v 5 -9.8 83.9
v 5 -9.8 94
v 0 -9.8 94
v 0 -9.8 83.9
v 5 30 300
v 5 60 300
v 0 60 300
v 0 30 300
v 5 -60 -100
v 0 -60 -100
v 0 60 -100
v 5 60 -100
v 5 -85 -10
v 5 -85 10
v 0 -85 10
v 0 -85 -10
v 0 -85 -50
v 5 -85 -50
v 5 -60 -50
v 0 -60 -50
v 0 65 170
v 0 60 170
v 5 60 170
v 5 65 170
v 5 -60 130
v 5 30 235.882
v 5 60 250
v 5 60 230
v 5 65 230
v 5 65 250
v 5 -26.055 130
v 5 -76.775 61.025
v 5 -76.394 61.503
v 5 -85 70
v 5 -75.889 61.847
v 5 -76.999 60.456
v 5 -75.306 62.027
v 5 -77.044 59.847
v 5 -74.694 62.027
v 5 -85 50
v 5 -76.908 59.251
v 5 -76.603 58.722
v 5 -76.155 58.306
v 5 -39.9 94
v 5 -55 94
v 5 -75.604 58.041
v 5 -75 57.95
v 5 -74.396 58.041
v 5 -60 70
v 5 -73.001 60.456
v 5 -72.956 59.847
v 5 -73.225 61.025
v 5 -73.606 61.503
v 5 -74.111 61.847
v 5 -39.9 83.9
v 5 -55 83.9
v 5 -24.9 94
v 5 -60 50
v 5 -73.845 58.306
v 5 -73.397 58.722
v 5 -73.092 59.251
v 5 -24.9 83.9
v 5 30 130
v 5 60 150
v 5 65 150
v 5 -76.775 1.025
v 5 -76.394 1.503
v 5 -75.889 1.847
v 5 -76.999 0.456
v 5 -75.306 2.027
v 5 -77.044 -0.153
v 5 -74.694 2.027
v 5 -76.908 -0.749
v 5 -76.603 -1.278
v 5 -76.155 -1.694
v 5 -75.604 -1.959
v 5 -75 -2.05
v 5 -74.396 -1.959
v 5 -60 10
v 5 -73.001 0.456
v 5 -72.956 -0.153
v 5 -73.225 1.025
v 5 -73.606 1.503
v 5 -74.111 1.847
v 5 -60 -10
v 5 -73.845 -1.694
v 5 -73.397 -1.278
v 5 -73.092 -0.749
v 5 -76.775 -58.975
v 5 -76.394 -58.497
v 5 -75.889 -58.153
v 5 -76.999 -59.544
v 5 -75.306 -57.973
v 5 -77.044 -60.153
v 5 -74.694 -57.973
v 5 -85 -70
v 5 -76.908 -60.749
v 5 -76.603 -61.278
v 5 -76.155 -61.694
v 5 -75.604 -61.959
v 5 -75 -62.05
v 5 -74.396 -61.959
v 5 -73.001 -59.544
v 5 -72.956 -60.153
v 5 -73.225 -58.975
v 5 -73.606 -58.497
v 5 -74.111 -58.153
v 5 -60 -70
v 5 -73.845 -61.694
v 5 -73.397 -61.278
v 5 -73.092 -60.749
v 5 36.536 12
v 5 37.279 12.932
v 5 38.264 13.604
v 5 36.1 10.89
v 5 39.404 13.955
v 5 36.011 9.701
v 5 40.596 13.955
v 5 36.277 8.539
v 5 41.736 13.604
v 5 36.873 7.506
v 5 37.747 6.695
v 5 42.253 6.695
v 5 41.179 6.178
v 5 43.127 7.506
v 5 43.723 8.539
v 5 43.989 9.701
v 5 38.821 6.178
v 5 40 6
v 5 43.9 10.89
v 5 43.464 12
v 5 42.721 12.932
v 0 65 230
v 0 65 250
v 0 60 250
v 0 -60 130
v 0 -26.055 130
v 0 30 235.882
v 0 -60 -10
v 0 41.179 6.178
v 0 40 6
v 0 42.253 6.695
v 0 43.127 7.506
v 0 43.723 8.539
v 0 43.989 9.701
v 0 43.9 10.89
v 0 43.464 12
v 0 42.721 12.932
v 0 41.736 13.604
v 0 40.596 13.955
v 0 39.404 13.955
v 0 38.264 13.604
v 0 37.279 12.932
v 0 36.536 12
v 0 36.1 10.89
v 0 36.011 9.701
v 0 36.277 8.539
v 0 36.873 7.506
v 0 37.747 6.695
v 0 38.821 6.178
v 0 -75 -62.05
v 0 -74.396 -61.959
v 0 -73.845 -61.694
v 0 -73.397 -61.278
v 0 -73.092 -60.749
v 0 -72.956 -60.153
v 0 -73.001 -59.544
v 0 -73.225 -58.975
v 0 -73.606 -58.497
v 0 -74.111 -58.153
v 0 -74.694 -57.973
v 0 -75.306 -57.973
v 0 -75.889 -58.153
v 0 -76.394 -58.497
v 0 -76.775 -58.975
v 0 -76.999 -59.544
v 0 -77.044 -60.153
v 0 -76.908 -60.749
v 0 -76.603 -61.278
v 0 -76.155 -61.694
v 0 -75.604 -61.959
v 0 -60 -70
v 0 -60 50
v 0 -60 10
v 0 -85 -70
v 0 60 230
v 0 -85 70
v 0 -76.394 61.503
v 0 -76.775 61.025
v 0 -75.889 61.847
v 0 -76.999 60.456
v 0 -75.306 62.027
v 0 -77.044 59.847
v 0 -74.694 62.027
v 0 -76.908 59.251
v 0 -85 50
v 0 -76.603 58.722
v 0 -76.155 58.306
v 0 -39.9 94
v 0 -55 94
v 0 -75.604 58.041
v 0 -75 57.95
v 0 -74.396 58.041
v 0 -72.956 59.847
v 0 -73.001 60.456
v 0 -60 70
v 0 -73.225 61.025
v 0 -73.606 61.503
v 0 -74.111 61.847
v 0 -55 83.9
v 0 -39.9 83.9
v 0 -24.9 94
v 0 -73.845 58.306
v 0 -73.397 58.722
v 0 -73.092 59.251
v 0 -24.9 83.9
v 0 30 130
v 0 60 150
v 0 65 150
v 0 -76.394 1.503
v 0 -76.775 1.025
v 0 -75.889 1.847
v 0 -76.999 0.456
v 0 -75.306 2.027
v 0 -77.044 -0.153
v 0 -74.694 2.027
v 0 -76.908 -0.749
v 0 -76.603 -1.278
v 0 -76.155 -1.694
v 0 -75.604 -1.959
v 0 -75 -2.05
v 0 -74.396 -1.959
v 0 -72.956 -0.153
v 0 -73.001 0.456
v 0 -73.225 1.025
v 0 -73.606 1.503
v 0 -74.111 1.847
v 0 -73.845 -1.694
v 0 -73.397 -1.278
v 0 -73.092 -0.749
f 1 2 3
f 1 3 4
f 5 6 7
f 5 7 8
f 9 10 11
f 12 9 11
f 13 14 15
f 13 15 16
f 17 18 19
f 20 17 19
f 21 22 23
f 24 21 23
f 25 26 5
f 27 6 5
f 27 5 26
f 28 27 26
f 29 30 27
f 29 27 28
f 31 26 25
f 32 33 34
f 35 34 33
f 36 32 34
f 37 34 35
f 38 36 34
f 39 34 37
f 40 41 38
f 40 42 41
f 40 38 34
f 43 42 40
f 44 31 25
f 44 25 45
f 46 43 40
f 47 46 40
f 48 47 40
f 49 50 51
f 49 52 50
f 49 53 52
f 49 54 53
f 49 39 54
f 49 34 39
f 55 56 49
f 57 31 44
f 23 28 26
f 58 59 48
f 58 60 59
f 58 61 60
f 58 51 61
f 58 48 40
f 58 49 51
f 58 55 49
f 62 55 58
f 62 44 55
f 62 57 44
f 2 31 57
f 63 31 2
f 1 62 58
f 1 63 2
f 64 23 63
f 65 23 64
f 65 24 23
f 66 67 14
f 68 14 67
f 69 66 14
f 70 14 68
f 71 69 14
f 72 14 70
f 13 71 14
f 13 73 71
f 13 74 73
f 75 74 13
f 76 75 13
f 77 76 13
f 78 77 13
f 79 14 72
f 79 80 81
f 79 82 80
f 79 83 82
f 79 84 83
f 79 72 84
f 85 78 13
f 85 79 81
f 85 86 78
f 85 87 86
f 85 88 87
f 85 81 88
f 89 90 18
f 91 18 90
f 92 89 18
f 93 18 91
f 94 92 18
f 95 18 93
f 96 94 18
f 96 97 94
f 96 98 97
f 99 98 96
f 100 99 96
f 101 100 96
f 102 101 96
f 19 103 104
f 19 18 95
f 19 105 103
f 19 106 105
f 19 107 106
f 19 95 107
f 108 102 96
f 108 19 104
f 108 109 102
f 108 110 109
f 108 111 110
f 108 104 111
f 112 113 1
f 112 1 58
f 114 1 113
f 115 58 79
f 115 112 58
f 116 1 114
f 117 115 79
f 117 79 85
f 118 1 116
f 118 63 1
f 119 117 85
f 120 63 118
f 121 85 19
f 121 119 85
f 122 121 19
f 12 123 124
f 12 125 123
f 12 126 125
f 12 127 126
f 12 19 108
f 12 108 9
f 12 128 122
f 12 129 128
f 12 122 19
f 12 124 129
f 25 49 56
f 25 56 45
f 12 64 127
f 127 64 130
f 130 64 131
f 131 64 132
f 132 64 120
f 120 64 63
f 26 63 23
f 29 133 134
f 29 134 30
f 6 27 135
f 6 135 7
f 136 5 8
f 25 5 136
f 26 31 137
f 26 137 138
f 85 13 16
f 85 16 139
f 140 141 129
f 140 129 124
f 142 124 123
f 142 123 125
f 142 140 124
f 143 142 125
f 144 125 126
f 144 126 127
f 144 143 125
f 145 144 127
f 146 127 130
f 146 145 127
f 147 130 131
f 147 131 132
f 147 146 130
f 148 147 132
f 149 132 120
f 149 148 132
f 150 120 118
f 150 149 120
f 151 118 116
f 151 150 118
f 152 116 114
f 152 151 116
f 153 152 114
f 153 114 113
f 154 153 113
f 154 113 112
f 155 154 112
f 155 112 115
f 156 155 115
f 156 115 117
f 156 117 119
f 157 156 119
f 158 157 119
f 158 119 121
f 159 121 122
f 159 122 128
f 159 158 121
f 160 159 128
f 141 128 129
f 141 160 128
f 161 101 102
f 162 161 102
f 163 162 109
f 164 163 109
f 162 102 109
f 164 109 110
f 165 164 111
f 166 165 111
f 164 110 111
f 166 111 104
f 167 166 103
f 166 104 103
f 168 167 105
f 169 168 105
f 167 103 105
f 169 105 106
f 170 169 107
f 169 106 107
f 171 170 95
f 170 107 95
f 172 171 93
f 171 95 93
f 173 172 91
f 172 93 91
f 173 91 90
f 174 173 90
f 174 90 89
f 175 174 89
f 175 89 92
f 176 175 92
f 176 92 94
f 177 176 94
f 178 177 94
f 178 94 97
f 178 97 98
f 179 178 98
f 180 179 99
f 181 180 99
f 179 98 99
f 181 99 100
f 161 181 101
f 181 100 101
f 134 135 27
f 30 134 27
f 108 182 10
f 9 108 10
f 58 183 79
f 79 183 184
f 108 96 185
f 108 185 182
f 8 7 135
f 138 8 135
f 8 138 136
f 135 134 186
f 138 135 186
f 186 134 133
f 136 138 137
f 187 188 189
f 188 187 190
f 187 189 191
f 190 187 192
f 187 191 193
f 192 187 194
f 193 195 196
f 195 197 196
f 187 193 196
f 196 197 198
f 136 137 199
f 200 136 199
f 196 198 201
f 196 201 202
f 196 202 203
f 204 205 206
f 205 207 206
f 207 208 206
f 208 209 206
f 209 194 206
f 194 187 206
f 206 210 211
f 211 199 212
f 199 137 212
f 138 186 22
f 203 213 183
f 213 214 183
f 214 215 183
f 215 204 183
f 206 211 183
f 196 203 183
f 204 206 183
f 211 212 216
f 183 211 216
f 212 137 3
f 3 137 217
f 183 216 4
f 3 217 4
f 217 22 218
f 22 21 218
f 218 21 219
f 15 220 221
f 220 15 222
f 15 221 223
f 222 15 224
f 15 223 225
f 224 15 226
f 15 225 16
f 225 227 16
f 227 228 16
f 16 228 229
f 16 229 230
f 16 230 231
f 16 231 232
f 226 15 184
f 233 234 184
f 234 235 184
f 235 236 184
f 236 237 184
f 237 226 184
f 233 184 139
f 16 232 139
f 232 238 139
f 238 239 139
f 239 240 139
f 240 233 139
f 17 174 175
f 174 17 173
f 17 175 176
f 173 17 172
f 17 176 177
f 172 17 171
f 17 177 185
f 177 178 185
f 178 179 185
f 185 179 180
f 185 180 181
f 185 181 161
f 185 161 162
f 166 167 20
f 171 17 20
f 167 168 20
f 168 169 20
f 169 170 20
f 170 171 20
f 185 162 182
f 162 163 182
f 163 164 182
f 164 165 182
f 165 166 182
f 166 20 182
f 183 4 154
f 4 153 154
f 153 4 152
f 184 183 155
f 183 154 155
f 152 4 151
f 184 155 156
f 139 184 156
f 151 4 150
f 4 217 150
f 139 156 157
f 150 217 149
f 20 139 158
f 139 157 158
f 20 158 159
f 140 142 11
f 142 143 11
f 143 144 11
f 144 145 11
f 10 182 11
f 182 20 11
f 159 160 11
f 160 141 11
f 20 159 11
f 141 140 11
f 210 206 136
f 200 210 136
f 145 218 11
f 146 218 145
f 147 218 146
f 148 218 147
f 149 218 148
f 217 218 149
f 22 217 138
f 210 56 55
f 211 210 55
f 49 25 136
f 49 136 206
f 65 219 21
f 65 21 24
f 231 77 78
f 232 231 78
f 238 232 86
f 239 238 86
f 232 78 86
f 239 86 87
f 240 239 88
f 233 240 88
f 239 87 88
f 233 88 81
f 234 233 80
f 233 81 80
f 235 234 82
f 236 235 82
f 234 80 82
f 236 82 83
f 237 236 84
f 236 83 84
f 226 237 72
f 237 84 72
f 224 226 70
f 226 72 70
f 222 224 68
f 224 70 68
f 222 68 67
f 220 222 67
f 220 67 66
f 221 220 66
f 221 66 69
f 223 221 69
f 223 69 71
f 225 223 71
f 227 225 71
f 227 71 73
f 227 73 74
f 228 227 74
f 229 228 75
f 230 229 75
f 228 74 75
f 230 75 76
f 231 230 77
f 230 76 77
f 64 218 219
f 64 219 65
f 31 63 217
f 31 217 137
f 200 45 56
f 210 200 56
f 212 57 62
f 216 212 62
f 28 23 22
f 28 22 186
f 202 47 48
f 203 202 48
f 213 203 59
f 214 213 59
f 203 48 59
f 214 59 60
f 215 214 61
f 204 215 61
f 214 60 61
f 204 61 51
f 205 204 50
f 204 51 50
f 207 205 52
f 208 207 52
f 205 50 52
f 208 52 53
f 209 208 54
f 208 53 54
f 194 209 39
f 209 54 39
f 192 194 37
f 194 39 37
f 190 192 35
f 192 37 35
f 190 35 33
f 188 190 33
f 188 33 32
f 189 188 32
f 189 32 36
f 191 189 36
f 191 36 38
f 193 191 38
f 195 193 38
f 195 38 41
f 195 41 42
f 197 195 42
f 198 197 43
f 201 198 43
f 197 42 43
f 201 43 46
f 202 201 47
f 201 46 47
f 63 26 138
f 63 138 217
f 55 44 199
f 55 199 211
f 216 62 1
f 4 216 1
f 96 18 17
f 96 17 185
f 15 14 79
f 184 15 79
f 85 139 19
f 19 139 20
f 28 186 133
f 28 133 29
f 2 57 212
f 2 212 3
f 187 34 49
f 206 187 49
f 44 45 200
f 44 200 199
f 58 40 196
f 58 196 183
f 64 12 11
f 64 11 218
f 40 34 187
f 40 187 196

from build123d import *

# Parameters (mm, degrees)
SKETCH_1_W          = 200
SKETCH_1_H          = 120
SKETCH_1_R          = 4
EXTRUDE_1_DEPTH     = 5
SKETCH_2_W          = 20
SKETCH_2_H          = 25
SKETCH_2_R          = 2.05
EXTRUDE_2_DEPTH     = 5
EXTRUDE_3_DEPTH     = 5
SKETCH_4_W          = 10.1
SKETCH_4_H          = 15.1
CUT_EXTRUDE_1_DEPTH = 312.84932259
SKETCH_5_W          = 5
SKETCH_5_H          = 20
EXTRUDE_4_DEPTH     = 5


with BuildPart() as part:
    # 草圖1 → 填料-伸長1 (new body)
    with BuildSketch(Plane(origin=(0, 0, 0), x_dir=(0, 0, -1), z_dir=(1, 0, 0))):
        Rectangle(SKETCH_1_W, SKETCH_1_H)
        with Locations((-10, 40)):
            Circle(SKETCH_1_R, mode=Mode.SUBTRACT)
    extrude(amount=EXTRUDE_1_DEPTH)

    # 草圖2 → 填料-伸長2 (add)
    # profile 1 of 3: a face of its own
    with BuildSketch(Plane(origin=(5, 0, 0), x_dir=(0, 0, -1), z_dir=(1, 0, 0))):
        with Locations((-60, -72.5)):
            Rectangle(SKETCH_2_W, SKETCH_2_H)
        with Locations((-60, -75)):
            Circle(SKETCH_2_R, mode=Mode.SUBTRACT)
    # profile 2 of 3: a face of its own
    with BuildSketch(Plane(origin=(5, 0, 0), x_dir=(0, 0, -1), z_dir=(1, 0, 0))):
        with Locations((0, -72.5)):
            Rectangle(SKETCH_2_W, SKETCH_2_H)
        with Locations((0, -75)):
            Circle(SKETCH_2_R, mode=Mode.SUBTRACT)
    # profile 3 of 3: a face of its own
    with BuildSketch(Plane(origin=(5, 0, 0), x_dir=(0, 0, -1), z_dir=(1, 0, 0))):
        with Locations((60, -72.5)):
            Rectangle(SKETCH_2_W, SKETCH_2_H)
        with Locations((60, -75)):
            Circle(SKETCH_2_R, mode=Mode.SUBTRACT)
    extrude(amount=-EXTRUDE_2_DEPTH)

    # 草圖3 → 填料-伸長3 (add)
    with BuildSketch(Plane(origin=(5, 0, 0), x_dir=(0, 0, -1), z_dir=(1, 0, 0))):
        Polygon((-100, 60), (-300, 60), (-300, 30), (-130, -60), (-100, -60), align=None)
        Polygon((-130, 30), (-130, -26.055204597), (-235.882053128, 30), align=None, mode=Mode.SUBTRACT)
    extrude(amount=-EXTRUDE_3_DEPTH)

    # 草圖4 → 除料-伸長1 (cut, through all)
    with BuildSketch(Plane(origin=(5, 0, 0), x_dir=(0, 0, -1), z_dir=(1, 0, 0))):
        with Locations((-88.95, -17.35)):
            Rectangle(SKETCH_4_W, SKETCH_4_H)
        with Locations((-88.95, -47.45)):
            Rectangle(SKETCH_4_W, SKETCH_4_H)
    extrude(amount=-CUT_EXTRUDE_1_DEPTH, mode=Mode.SUBTRACT)

    # 草圖5 → 填料-伸長4 (add)
    with BuildSketch(Plane(origin=(0, 60, 0), x_dir=(1, 0, 0), z_dir=(0, 1, 0))):
        with Locations((2.5, -160)):
            Rectangle(SKETCH_5_W, SKETCH_5_H)
        with Locations((2.5, -240)):
            Rectangle(SKETCH_5_W, SKETCH_5_H)
    extrude(amount=EXTRUDE_4_DEPTH)


solid = part.part
